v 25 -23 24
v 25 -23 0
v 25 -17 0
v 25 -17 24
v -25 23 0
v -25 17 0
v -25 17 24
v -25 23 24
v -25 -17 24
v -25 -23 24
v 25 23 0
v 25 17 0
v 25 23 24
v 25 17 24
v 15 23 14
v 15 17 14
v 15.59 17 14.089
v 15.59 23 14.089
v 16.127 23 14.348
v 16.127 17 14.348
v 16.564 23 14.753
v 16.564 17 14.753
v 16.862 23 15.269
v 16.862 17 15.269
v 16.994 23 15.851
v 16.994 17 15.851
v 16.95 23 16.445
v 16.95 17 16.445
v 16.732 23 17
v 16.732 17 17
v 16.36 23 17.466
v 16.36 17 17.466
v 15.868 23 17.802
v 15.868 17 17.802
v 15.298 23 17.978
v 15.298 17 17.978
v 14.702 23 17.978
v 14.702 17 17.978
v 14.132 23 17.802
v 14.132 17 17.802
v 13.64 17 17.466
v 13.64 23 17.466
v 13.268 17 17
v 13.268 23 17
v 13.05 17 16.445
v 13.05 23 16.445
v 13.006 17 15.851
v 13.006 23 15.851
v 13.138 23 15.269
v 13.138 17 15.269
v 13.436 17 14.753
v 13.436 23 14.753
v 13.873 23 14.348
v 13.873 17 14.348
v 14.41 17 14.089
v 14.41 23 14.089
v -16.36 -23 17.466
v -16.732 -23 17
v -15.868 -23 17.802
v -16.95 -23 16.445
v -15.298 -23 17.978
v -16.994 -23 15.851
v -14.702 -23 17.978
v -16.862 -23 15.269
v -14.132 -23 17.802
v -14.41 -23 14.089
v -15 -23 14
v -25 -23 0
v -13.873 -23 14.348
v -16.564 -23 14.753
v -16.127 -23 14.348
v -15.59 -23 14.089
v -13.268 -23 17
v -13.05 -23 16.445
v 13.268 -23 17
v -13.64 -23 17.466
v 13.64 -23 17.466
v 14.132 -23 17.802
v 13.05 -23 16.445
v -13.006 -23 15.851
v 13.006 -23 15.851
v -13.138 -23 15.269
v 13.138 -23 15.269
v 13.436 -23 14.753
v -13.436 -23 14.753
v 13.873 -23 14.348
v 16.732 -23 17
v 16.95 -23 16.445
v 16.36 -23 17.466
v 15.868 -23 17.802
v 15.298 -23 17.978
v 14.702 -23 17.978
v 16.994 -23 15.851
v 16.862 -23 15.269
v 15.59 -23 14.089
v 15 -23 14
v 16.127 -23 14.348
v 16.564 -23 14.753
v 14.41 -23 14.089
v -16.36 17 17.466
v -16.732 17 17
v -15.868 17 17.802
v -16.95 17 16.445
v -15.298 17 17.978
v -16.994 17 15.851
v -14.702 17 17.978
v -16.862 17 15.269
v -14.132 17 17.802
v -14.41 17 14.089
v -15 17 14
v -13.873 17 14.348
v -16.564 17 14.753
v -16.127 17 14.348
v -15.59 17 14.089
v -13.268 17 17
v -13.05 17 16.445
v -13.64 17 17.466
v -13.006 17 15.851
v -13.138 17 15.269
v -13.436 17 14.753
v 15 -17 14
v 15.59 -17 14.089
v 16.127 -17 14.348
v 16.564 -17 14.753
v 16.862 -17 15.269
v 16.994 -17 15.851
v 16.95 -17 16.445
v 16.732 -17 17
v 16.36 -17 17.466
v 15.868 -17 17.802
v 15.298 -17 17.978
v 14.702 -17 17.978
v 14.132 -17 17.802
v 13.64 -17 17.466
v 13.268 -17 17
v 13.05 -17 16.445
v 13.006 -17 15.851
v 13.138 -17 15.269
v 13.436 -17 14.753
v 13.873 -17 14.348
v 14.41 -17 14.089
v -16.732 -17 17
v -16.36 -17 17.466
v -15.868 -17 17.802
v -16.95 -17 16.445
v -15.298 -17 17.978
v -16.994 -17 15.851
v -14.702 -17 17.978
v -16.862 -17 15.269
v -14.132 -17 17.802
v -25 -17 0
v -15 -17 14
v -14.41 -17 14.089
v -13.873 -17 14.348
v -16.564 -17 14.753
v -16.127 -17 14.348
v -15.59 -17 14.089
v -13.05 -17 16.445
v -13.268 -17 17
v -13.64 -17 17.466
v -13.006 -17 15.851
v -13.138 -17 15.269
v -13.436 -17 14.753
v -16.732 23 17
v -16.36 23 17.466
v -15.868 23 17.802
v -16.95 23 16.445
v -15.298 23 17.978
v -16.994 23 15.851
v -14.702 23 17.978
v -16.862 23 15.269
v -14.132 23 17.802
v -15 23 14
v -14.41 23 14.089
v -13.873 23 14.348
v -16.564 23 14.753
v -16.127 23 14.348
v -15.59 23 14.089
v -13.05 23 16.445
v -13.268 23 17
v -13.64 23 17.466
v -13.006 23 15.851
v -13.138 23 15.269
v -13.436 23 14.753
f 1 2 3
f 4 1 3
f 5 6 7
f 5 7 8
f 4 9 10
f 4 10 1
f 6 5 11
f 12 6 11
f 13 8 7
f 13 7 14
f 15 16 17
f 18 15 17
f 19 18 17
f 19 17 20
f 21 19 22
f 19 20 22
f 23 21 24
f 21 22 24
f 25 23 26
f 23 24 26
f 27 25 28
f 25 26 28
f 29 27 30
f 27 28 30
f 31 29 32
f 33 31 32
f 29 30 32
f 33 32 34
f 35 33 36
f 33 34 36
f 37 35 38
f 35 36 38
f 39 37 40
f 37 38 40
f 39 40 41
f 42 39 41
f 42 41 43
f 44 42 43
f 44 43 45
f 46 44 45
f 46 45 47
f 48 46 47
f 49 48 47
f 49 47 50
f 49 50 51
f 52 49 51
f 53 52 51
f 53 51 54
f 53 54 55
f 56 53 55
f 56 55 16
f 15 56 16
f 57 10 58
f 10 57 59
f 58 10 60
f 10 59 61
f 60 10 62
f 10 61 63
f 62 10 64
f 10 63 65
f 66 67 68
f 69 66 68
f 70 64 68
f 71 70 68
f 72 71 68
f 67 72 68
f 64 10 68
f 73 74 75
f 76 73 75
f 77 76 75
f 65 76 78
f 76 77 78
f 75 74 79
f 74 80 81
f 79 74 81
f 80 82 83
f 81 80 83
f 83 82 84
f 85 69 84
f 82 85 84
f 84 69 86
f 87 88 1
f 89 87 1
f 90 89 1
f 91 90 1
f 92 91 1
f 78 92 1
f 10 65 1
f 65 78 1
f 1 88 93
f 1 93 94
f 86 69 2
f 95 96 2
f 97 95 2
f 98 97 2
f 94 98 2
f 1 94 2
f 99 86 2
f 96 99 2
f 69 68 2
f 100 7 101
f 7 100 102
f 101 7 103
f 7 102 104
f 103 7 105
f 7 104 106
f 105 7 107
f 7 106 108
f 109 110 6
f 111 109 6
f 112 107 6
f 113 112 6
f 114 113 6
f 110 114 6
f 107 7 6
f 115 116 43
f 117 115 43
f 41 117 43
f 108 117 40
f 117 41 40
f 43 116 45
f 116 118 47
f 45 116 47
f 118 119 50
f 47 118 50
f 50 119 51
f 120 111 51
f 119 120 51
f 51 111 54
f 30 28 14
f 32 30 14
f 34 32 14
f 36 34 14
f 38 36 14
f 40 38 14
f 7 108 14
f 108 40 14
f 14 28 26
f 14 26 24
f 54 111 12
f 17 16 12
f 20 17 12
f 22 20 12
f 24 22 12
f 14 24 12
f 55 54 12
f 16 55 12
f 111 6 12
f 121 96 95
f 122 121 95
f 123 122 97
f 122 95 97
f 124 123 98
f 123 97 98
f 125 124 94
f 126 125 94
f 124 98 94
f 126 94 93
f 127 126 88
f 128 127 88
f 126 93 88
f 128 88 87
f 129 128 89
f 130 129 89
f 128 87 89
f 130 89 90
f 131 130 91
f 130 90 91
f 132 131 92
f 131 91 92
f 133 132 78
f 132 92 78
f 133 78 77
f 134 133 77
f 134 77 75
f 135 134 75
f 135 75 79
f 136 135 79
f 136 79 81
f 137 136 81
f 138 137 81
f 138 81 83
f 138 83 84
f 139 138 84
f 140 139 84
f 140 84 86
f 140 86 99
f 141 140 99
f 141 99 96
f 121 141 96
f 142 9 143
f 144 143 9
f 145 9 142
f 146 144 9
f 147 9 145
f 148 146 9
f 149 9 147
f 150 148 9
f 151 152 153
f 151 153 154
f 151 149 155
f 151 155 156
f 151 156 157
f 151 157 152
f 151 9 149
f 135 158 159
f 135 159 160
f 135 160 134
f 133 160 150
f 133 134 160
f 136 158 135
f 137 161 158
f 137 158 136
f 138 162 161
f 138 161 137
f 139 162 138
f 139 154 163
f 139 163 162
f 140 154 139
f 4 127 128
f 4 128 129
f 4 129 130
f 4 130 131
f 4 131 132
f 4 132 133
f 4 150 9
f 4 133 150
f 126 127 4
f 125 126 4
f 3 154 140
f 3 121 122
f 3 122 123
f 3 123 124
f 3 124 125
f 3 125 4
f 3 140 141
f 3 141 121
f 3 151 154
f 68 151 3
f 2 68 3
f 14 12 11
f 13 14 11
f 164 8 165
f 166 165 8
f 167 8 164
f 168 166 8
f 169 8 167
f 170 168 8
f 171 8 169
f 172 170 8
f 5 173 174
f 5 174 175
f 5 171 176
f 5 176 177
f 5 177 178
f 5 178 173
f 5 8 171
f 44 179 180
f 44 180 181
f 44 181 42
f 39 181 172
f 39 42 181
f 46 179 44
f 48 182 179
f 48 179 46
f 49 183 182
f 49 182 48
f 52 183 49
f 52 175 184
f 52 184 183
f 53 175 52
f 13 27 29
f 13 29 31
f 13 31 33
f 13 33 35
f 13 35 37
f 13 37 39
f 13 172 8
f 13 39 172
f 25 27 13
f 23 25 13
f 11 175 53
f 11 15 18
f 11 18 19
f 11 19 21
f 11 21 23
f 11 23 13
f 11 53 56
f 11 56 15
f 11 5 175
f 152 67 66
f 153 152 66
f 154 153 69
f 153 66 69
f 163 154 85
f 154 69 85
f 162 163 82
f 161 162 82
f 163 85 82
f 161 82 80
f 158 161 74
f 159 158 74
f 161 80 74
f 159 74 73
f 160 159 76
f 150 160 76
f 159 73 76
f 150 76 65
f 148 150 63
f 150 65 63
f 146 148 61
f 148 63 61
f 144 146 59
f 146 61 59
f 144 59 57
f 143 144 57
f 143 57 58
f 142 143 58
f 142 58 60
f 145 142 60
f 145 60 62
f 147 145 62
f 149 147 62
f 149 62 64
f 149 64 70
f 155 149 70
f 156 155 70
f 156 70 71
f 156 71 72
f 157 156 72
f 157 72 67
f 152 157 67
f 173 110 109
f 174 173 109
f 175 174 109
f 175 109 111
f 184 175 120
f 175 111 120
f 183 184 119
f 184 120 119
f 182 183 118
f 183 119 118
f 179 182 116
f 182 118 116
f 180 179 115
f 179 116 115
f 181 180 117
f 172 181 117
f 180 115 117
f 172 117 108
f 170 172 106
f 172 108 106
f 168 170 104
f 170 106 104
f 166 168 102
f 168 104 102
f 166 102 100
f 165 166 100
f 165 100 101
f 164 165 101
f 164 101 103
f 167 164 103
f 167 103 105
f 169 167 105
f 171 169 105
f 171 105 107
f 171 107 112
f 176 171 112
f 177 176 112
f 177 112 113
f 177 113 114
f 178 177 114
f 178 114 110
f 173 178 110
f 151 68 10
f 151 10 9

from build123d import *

# Parameters (mm, degrees)
SKETCH_1_W          = 50
SKETCH_1_H          = 6
EXTRUDE_1_DEPTH     = 24
EXTRUDE_1_2_DEPTH   = 24
SKETCH_2_R          = 2
CUT_EXTRUDE_1_DEPTH = 58.5934024


with BuildPart() as part:
    # 草图1 → 凸台-拉伸1 (new body)
    with BuildSketch(Plane.XY):
        with Locations((0, -20)):
            Rectangle(SKETCH_1_W, SKETCH_1_H)
    extrude(amount=EXTRUDE_1_DEPTH)


with BuildPart() as body_2:
    # 草图1 → Extrude 1 2 (new body)
    with BuildSketch(Plane.XY):
        with Locations((0, 20)):
            Rectangle(SKETCH_1_W, SKETCH_1_H)
    extrude(amount=EXTRUDE_1_2_DEPTH)


with BuildPart() as cut_extrude_1_tool:
    # 草图2 → 切除-拉伸1 (new, through all)
    with BuildSketch(Plane.XZ.offset(23)):
        with Locations(Location((-15, 16, 0), (0, 0, 270))):
            Circle(SKETCH_2_R)
        with Locations(Location((15, 16, 0), (0, 0, 270))):
            Circle(SKETCH_2_R)
    extrude(amount=-CUT_EXTRUDE_1_DEPTH)


with BuildPart() as part_1:
    add(part.part)

    # 切除-拉伸1: cut by cut_extrude_1_tool
    add(cut_extrude_1_tool.part, mode=Mode.SUBTRACT)


with BuildPart() as body_2_1:
    add(body_2.part)

    # 切除-拉伸1: cut by cut_extrude_1_tool
    add(cut_extrude_1_tool.part, mode=Mode.SUBTRACT)


solid = Compound([part_1.part, body_2_1.part])
